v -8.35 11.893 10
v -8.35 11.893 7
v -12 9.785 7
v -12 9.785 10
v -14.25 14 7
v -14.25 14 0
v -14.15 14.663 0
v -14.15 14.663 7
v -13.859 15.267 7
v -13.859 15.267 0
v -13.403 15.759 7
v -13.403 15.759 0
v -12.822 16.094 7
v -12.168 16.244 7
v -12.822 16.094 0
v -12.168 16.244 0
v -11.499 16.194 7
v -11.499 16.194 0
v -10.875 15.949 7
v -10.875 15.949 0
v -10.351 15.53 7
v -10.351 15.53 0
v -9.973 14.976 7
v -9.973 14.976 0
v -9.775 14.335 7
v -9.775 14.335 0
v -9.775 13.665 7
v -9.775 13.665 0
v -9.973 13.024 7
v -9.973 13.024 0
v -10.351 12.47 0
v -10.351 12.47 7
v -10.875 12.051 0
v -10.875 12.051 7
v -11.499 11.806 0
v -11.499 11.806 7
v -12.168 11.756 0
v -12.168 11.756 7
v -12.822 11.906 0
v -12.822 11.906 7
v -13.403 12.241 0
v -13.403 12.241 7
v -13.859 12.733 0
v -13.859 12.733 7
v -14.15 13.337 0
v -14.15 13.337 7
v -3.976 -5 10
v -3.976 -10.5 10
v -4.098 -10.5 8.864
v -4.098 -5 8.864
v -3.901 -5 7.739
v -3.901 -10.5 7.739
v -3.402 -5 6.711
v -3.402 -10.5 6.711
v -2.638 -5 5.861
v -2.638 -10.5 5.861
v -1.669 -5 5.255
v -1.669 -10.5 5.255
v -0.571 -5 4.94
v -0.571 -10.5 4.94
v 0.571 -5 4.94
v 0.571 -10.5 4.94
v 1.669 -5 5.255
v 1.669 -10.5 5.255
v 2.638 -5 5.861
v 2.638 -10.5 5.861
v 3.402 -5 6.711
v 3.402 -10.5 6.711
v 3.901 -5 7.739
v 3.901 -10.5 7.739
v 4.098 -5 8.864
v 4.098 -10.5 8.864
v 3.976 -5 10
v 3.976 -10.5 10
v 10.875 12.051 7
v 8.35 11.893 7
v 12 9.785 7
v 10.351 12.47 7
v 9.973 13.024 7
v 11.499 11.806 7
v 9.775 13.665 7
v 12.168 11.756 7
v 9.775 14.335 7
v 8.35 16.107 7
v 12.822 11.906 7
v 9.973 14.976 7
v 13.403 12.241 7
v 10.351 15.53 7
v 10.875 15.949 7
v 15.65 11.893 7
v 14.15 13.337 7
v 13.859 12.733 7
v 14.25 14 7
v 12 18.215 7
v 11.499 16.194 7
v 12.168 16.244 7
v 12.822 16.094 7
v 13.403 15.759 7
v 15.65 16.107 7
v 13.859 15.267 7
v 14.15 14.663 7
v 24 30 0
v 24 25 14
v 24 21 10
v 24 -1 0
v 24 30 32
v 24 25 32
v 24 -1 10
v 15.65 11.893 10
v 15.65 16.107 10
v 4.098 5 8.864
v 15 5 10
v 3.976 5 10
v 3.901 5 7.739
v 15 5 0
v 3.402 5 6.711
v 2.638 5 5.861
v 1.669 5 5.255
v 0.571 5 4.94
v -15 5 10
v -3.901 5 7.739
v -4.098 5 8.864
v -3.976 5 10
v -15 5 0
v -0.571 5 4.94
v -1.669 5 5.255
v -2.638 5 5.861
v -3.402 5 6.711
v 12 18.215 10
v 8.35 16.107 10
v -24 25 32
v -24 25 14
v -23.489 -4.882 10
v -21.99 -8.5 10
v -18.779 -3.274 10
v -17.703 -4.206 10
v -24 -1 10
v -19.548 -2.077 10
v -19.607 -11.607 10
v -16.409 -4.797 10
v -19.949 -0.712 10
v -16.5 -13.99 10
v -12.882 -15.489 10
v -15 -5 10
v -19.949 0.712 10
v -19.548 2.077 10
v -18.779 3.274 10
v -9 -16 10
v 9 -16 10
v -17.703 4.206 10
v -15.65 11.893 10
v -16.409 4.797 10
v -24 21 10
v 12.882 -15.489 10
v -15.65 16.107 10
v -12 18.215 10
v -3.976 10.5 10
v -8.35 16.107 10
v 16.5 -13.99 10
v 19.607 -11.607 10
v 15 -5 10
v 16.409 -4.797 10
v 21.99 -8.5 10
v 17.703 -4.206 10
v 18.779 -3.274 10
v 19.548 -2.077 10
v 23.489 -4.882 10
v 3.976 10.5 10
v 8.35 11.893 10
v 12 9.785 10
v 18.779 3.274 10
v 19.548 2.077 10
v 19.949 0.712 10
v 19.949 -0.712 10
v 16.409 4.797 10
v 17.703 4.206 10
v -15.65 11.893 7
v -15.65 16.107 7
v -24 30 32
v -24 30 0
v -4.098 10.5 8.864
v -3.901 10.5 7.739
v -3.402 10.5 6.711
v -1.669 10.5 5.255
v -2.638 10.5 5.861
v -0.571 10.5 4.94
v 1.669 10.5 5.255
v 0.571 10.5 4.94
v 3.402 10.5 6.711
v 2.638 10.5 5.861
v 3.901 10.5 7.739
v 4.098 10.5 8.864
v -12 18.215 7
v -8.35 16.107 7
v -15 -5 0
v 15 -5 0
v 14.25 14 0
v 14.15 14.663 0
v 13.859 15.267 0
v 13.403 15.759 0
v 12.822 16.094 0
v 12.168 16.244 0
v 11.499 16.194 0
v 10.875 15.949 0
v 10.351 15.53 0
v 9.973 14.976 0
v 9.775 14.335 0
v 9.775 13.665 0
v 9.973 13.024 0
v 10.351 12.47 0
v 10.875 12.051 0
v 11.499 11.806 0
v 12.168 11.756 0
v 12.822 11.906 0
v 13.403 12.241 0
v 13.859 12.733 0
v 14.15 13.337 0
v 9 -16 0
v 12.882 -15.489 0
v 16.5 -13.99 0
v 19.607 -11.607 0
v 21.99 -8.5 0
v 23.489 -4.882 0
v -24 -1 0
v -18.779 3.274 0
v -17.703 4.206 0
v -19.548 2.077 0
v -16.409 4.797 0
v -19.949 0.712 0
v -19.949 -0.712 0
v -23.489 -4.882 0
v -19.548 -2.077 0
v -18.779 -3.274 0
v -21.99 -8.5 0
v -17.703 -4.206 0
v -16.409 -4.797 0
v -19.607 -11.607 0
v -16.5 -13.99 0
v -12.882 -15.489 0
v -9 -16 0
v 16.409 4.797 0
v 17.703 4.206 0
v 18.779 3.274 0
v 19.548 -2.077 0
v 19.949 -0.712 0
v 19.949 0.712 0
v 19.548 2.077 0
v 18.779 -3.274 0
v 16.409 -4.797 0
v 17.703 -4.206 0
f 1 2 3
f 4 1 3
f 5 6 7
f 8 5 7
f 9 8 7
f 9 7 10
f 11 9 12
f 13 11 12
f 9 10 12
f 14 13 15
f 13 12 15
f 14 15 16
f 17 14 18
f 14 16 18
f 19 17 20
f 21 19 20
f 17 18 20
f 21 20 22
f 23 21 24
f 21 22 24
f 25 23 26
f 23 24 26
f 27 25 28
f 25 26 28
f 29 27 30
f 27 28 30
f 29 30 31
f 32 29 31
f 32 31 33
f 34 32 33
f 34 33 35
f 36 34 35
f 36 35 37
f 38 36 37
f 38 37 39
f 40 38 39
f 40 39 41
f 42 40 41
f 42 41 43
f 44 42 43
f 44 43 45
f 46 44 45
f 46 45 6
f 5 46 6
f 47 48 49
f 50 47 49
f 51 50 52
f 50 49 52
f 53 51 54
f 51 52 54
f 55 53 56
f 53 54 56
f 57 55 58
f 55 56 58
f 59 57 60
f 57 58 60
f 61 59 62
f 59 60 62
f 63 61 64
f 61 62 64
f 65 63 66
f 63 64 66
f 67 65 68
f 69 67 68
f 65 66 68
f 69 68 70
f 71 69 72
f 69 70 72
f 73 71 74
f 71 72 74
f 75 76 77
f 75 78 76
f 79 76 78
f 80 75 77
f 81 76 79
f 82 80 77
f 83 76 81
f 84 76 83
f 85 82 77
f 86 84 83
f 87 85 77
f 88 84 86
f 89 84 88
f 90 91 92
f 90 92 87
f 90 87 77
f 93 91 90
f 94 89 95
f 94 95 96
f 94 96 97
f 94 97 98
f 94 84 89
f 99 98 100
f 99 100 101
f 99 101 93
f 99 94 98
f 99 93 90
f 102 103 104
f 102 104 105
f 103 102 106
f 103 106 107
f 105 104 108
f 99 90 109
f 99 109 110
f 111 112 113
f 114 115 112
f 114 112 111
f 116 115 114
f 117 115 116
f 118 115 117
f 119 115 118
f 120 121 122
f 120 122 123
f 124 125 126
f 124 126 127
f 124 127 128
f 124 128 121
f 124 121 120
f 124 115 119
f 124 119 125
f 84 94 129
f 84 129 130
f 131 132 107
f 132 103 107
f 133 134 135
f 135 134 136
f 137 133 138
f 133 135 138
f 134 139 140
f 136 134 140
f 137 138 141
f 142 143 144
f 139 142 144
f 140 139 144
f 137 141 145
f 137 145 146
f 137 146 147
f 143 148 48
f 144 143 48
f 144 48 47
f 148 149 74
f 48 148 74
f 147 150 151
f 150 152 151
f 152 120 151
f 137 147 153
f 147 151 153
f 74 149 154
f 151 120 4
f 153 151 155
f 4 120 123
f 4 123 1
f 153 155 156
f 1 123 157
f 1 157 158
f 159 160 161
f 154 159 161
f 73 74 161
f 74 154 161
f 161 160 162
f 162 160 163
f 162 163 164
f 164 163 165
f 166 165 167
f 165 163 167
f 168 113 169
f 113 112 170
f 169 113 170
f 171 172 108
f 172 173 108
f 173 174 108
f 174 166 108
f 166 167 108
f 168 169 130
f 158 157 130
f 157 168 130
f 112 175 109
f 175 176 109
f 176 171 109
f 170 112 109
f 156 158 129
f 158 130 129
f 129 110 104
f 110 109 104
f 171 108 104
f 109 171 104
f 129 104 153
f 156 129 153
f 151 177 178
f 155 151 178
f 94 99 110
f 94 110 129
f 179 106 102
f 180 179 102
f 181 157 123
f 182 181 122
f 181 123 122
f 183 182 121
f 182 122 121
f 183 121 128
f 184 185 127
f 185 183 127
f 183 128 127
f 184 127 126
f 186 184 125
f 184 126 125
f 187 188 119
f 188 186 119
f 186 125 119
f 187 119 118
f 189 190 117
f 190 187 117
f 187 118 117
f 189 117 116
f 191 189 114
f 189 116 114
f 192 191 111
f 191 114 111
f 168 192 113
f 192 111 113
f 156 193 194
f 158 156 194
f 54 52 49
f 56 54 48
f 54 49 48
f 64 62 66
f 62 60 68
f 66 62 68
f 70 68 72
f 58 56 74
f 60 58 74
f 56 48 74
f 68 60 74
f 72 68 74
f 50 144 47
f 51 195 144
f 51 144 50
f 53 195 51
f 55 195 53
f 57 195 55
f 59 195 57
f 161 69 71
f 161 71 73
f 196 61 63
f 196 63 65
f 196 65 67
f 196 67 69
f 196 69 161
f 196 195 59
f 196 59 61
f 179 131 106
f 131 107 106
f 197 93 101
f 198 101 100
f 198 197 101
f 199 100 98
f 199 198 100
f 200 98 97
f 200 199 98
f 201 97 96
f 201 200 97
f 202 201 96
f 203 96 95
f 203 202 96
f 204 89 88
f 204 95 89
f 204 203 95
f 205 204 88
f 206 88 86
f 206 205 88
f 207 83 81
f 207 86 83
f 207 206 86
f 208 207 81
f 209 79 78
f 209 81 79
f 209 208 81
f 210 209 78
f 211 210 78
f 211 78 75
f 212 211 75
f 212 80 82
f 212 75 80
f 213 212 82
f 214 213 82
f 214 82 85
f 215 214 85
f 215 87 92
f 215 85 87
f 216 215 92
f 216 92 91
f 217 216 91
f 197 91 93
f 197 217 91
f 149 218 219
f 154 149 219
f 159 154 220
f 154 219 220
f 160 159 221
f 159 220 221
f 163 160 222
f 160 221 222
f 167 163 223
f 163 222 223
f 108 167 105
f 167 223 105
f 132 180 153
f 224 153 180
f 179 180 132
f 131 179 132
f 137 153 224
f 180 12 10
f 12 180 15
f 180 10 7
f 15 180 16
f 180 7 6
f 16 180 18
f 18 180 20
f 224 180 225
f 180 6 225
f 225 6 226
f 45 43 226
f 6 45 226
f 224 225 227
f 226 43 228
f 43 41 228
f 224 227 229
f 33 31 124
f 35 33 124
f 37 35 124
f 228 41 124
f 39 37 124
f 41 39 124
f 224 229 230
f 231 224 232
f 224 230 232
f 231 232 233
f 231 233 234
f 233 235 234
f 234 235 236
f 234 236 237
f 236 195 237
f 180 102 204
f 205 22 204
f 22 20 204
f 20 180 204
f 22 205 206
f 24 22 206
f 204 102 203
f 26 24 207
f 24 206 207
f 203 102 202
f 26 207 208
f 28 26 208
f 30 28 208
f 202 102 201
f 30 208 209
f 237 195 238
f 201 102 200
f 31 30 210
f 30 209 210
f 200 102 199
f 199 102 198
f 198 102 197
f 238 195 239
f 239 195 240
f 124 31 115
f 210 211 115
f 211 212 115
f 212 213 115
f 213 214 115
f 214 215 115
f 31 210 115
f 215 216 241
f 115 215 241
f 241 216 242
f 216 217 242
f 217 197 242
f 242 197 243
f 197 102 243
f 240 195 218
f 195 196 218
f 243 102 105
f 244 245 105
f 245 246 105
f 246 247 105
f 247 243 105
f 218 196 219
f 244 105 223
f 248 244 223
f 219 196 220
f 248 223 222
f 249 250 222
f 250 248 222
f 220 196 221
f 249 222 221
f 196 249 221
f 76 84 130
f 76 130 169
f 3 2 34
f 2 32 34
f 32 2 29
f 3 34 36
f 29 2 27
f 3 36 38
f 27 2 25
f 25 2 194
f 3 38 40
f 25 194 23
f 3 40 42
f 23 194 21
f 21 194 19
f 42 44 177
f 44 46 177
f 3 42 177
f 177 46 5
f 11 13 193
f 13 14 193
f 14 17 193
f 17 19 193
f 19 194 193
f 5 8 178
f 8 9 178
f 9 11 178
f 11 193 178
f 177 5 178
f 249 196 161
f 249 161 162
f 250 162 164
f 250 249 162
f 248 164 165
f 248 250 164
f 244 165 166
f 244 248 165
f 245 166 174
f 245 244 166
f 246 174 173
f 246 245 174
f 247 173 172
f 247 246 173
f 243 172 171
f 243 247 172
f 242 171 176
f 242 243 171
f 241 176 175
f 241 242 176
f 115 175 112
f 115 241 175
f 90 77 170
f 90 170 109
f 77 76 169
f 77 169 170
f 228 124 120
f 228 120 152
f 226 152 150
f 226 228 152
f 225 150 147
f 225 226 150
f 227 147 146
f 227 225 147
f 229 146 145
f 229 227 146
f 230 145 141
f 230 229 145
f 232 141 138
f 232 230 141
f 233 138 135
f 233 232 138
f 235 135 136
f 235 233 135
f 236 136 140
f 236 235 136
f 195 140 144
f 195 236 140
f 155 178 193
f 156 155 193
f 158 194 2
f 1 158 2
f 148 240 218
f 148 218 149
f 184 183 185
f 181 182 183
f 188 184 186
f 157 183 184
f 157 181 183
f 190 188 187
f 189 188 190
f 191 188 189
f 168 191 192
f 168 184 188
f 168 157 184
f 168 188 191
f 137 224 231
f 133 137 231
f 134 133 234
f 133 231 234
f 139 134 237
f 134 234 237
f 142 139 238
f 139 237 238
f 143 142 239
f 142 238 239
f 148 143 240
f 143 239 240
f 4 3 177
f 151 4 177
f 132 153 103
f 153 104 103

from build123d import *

# Parameters (mm, degrees)
PAD_DEPTH            = 24
POCKET_DEPTH         = 0.001
POCKET_DEPTH_BACK    = -32.001
SKETCH002_R          = 4.1
POCKET001_DEPTH      = 10.5
SKETCH003_R          = 2.25
HOLE_DEPTH           = 179.567934
POCKET002_DEPTH      = 172.567934
POCKET003_DEPTH      = 0.001
POCKET003_DEPTH_BACK = -32.001


with BuildPart() as part:
    # Sketch001 → Pad (new body, symmetric)
    with BuildSketch(Plane.YZ):
        Polygon((-16, 0), (-16, 10), (21, 10), (25, 14), (25, 32), (30, 32), (30, 0), align=None)
    extrude(amount=PAD_DEPTH, both=True)

    # Sketch → Pocket (cut, two sides)
    with BuildSketch(Plane.XY) as pocket_sk:
        with BuildLine():
            ThreePointArc((-15, 5), (-20, 0), (-15, -5))
            Line((-15, -5), (15, -5))
            ThreePointArc((15, -5), (20, 0), (15, 5))
            Line((15, 5), (-15, 5))
        make_face()
    extrude(amount=-POCKET_DEPTH, mode=Mode.SUBTRACT)
    extrude(pocket_sk.sketch, amount=-POCKET_DEPTH_BACK, mode=Mode.SUBTRACT)

    # Sketch002 → Pocket001 (cut, symmetric)
    with BuildSketch(Plane.XZ):
        with Locations((0, 9)):
            Circle(SKETCH002_R)
    extrude(amount=POCKET001_DEPTH, both=True, mode=Mode.SUBTRACT)

    # Sketch003 → Hole (cut, through all)
    with BuildSketch(Plane(origin=(12, 14, 0), x_dir=(1, 0, 0), z_dir=(0, 0, 1))):
        Circle(SKETCH003_R)
    hole = extrude(amount=HOLE_DEPTH, mode=Mode.SUBTRACT)

    # Sketch004 (on Sketch) → Pocket002 (cut, through all)
    with BuildSketch(Plane(origin=(12, 14, 7), x_dir=(1, 0, 0), z_dir=(0, 0, 1))):
        Polygon((0, 4.214657), (-3.65, 2.107328), (-3.65, -2.107328), (0, -4.214657), (3.65, -2.107328), (3.65, 2.107328), align=None)
    pocket002 = extrude(amount=POCKET002_DEPTH, mode=Mode.SUBTRACT)

    # Mirrored: Pocket002, Hole across YZ
    add(pocket002.mirror(Plane.YZ), mode=Mode.SUBTRACT)
    add(hole.mirror(Plane.YZ), mode=Mode.SUBTRACT)

    # Sketch005 → Pocket003 (cut, two sides)
    with BuildSketch(Plane.XY) as pocket003_sk:
        with BuildLine():
            ThreePointArc((-24, -1), (-19.606602, -11.606602), (-9, -16))
            Line((-9, -16), (9, -16))
            ThreePointArc((9, -16), (19.606602, -11.606602), (24, -1))
            Line((34, -1), (24, -1))
            Line((34, -1), (34, -69))
            Line((34, -69), (-34, -69))
            Line((-34, -69), (-34, -1))
            Line((-24, -1), (-34, -1))
        make_face()
    extrude(amount=-POCKET003_DEPTH, mode=Mode.SUBTRACT)
    extrude(pocket003_sk.sketch, amount=-POCKET003_DEPTH_BACK, mode=Mode.SUBTRACT)


solid = part.part
